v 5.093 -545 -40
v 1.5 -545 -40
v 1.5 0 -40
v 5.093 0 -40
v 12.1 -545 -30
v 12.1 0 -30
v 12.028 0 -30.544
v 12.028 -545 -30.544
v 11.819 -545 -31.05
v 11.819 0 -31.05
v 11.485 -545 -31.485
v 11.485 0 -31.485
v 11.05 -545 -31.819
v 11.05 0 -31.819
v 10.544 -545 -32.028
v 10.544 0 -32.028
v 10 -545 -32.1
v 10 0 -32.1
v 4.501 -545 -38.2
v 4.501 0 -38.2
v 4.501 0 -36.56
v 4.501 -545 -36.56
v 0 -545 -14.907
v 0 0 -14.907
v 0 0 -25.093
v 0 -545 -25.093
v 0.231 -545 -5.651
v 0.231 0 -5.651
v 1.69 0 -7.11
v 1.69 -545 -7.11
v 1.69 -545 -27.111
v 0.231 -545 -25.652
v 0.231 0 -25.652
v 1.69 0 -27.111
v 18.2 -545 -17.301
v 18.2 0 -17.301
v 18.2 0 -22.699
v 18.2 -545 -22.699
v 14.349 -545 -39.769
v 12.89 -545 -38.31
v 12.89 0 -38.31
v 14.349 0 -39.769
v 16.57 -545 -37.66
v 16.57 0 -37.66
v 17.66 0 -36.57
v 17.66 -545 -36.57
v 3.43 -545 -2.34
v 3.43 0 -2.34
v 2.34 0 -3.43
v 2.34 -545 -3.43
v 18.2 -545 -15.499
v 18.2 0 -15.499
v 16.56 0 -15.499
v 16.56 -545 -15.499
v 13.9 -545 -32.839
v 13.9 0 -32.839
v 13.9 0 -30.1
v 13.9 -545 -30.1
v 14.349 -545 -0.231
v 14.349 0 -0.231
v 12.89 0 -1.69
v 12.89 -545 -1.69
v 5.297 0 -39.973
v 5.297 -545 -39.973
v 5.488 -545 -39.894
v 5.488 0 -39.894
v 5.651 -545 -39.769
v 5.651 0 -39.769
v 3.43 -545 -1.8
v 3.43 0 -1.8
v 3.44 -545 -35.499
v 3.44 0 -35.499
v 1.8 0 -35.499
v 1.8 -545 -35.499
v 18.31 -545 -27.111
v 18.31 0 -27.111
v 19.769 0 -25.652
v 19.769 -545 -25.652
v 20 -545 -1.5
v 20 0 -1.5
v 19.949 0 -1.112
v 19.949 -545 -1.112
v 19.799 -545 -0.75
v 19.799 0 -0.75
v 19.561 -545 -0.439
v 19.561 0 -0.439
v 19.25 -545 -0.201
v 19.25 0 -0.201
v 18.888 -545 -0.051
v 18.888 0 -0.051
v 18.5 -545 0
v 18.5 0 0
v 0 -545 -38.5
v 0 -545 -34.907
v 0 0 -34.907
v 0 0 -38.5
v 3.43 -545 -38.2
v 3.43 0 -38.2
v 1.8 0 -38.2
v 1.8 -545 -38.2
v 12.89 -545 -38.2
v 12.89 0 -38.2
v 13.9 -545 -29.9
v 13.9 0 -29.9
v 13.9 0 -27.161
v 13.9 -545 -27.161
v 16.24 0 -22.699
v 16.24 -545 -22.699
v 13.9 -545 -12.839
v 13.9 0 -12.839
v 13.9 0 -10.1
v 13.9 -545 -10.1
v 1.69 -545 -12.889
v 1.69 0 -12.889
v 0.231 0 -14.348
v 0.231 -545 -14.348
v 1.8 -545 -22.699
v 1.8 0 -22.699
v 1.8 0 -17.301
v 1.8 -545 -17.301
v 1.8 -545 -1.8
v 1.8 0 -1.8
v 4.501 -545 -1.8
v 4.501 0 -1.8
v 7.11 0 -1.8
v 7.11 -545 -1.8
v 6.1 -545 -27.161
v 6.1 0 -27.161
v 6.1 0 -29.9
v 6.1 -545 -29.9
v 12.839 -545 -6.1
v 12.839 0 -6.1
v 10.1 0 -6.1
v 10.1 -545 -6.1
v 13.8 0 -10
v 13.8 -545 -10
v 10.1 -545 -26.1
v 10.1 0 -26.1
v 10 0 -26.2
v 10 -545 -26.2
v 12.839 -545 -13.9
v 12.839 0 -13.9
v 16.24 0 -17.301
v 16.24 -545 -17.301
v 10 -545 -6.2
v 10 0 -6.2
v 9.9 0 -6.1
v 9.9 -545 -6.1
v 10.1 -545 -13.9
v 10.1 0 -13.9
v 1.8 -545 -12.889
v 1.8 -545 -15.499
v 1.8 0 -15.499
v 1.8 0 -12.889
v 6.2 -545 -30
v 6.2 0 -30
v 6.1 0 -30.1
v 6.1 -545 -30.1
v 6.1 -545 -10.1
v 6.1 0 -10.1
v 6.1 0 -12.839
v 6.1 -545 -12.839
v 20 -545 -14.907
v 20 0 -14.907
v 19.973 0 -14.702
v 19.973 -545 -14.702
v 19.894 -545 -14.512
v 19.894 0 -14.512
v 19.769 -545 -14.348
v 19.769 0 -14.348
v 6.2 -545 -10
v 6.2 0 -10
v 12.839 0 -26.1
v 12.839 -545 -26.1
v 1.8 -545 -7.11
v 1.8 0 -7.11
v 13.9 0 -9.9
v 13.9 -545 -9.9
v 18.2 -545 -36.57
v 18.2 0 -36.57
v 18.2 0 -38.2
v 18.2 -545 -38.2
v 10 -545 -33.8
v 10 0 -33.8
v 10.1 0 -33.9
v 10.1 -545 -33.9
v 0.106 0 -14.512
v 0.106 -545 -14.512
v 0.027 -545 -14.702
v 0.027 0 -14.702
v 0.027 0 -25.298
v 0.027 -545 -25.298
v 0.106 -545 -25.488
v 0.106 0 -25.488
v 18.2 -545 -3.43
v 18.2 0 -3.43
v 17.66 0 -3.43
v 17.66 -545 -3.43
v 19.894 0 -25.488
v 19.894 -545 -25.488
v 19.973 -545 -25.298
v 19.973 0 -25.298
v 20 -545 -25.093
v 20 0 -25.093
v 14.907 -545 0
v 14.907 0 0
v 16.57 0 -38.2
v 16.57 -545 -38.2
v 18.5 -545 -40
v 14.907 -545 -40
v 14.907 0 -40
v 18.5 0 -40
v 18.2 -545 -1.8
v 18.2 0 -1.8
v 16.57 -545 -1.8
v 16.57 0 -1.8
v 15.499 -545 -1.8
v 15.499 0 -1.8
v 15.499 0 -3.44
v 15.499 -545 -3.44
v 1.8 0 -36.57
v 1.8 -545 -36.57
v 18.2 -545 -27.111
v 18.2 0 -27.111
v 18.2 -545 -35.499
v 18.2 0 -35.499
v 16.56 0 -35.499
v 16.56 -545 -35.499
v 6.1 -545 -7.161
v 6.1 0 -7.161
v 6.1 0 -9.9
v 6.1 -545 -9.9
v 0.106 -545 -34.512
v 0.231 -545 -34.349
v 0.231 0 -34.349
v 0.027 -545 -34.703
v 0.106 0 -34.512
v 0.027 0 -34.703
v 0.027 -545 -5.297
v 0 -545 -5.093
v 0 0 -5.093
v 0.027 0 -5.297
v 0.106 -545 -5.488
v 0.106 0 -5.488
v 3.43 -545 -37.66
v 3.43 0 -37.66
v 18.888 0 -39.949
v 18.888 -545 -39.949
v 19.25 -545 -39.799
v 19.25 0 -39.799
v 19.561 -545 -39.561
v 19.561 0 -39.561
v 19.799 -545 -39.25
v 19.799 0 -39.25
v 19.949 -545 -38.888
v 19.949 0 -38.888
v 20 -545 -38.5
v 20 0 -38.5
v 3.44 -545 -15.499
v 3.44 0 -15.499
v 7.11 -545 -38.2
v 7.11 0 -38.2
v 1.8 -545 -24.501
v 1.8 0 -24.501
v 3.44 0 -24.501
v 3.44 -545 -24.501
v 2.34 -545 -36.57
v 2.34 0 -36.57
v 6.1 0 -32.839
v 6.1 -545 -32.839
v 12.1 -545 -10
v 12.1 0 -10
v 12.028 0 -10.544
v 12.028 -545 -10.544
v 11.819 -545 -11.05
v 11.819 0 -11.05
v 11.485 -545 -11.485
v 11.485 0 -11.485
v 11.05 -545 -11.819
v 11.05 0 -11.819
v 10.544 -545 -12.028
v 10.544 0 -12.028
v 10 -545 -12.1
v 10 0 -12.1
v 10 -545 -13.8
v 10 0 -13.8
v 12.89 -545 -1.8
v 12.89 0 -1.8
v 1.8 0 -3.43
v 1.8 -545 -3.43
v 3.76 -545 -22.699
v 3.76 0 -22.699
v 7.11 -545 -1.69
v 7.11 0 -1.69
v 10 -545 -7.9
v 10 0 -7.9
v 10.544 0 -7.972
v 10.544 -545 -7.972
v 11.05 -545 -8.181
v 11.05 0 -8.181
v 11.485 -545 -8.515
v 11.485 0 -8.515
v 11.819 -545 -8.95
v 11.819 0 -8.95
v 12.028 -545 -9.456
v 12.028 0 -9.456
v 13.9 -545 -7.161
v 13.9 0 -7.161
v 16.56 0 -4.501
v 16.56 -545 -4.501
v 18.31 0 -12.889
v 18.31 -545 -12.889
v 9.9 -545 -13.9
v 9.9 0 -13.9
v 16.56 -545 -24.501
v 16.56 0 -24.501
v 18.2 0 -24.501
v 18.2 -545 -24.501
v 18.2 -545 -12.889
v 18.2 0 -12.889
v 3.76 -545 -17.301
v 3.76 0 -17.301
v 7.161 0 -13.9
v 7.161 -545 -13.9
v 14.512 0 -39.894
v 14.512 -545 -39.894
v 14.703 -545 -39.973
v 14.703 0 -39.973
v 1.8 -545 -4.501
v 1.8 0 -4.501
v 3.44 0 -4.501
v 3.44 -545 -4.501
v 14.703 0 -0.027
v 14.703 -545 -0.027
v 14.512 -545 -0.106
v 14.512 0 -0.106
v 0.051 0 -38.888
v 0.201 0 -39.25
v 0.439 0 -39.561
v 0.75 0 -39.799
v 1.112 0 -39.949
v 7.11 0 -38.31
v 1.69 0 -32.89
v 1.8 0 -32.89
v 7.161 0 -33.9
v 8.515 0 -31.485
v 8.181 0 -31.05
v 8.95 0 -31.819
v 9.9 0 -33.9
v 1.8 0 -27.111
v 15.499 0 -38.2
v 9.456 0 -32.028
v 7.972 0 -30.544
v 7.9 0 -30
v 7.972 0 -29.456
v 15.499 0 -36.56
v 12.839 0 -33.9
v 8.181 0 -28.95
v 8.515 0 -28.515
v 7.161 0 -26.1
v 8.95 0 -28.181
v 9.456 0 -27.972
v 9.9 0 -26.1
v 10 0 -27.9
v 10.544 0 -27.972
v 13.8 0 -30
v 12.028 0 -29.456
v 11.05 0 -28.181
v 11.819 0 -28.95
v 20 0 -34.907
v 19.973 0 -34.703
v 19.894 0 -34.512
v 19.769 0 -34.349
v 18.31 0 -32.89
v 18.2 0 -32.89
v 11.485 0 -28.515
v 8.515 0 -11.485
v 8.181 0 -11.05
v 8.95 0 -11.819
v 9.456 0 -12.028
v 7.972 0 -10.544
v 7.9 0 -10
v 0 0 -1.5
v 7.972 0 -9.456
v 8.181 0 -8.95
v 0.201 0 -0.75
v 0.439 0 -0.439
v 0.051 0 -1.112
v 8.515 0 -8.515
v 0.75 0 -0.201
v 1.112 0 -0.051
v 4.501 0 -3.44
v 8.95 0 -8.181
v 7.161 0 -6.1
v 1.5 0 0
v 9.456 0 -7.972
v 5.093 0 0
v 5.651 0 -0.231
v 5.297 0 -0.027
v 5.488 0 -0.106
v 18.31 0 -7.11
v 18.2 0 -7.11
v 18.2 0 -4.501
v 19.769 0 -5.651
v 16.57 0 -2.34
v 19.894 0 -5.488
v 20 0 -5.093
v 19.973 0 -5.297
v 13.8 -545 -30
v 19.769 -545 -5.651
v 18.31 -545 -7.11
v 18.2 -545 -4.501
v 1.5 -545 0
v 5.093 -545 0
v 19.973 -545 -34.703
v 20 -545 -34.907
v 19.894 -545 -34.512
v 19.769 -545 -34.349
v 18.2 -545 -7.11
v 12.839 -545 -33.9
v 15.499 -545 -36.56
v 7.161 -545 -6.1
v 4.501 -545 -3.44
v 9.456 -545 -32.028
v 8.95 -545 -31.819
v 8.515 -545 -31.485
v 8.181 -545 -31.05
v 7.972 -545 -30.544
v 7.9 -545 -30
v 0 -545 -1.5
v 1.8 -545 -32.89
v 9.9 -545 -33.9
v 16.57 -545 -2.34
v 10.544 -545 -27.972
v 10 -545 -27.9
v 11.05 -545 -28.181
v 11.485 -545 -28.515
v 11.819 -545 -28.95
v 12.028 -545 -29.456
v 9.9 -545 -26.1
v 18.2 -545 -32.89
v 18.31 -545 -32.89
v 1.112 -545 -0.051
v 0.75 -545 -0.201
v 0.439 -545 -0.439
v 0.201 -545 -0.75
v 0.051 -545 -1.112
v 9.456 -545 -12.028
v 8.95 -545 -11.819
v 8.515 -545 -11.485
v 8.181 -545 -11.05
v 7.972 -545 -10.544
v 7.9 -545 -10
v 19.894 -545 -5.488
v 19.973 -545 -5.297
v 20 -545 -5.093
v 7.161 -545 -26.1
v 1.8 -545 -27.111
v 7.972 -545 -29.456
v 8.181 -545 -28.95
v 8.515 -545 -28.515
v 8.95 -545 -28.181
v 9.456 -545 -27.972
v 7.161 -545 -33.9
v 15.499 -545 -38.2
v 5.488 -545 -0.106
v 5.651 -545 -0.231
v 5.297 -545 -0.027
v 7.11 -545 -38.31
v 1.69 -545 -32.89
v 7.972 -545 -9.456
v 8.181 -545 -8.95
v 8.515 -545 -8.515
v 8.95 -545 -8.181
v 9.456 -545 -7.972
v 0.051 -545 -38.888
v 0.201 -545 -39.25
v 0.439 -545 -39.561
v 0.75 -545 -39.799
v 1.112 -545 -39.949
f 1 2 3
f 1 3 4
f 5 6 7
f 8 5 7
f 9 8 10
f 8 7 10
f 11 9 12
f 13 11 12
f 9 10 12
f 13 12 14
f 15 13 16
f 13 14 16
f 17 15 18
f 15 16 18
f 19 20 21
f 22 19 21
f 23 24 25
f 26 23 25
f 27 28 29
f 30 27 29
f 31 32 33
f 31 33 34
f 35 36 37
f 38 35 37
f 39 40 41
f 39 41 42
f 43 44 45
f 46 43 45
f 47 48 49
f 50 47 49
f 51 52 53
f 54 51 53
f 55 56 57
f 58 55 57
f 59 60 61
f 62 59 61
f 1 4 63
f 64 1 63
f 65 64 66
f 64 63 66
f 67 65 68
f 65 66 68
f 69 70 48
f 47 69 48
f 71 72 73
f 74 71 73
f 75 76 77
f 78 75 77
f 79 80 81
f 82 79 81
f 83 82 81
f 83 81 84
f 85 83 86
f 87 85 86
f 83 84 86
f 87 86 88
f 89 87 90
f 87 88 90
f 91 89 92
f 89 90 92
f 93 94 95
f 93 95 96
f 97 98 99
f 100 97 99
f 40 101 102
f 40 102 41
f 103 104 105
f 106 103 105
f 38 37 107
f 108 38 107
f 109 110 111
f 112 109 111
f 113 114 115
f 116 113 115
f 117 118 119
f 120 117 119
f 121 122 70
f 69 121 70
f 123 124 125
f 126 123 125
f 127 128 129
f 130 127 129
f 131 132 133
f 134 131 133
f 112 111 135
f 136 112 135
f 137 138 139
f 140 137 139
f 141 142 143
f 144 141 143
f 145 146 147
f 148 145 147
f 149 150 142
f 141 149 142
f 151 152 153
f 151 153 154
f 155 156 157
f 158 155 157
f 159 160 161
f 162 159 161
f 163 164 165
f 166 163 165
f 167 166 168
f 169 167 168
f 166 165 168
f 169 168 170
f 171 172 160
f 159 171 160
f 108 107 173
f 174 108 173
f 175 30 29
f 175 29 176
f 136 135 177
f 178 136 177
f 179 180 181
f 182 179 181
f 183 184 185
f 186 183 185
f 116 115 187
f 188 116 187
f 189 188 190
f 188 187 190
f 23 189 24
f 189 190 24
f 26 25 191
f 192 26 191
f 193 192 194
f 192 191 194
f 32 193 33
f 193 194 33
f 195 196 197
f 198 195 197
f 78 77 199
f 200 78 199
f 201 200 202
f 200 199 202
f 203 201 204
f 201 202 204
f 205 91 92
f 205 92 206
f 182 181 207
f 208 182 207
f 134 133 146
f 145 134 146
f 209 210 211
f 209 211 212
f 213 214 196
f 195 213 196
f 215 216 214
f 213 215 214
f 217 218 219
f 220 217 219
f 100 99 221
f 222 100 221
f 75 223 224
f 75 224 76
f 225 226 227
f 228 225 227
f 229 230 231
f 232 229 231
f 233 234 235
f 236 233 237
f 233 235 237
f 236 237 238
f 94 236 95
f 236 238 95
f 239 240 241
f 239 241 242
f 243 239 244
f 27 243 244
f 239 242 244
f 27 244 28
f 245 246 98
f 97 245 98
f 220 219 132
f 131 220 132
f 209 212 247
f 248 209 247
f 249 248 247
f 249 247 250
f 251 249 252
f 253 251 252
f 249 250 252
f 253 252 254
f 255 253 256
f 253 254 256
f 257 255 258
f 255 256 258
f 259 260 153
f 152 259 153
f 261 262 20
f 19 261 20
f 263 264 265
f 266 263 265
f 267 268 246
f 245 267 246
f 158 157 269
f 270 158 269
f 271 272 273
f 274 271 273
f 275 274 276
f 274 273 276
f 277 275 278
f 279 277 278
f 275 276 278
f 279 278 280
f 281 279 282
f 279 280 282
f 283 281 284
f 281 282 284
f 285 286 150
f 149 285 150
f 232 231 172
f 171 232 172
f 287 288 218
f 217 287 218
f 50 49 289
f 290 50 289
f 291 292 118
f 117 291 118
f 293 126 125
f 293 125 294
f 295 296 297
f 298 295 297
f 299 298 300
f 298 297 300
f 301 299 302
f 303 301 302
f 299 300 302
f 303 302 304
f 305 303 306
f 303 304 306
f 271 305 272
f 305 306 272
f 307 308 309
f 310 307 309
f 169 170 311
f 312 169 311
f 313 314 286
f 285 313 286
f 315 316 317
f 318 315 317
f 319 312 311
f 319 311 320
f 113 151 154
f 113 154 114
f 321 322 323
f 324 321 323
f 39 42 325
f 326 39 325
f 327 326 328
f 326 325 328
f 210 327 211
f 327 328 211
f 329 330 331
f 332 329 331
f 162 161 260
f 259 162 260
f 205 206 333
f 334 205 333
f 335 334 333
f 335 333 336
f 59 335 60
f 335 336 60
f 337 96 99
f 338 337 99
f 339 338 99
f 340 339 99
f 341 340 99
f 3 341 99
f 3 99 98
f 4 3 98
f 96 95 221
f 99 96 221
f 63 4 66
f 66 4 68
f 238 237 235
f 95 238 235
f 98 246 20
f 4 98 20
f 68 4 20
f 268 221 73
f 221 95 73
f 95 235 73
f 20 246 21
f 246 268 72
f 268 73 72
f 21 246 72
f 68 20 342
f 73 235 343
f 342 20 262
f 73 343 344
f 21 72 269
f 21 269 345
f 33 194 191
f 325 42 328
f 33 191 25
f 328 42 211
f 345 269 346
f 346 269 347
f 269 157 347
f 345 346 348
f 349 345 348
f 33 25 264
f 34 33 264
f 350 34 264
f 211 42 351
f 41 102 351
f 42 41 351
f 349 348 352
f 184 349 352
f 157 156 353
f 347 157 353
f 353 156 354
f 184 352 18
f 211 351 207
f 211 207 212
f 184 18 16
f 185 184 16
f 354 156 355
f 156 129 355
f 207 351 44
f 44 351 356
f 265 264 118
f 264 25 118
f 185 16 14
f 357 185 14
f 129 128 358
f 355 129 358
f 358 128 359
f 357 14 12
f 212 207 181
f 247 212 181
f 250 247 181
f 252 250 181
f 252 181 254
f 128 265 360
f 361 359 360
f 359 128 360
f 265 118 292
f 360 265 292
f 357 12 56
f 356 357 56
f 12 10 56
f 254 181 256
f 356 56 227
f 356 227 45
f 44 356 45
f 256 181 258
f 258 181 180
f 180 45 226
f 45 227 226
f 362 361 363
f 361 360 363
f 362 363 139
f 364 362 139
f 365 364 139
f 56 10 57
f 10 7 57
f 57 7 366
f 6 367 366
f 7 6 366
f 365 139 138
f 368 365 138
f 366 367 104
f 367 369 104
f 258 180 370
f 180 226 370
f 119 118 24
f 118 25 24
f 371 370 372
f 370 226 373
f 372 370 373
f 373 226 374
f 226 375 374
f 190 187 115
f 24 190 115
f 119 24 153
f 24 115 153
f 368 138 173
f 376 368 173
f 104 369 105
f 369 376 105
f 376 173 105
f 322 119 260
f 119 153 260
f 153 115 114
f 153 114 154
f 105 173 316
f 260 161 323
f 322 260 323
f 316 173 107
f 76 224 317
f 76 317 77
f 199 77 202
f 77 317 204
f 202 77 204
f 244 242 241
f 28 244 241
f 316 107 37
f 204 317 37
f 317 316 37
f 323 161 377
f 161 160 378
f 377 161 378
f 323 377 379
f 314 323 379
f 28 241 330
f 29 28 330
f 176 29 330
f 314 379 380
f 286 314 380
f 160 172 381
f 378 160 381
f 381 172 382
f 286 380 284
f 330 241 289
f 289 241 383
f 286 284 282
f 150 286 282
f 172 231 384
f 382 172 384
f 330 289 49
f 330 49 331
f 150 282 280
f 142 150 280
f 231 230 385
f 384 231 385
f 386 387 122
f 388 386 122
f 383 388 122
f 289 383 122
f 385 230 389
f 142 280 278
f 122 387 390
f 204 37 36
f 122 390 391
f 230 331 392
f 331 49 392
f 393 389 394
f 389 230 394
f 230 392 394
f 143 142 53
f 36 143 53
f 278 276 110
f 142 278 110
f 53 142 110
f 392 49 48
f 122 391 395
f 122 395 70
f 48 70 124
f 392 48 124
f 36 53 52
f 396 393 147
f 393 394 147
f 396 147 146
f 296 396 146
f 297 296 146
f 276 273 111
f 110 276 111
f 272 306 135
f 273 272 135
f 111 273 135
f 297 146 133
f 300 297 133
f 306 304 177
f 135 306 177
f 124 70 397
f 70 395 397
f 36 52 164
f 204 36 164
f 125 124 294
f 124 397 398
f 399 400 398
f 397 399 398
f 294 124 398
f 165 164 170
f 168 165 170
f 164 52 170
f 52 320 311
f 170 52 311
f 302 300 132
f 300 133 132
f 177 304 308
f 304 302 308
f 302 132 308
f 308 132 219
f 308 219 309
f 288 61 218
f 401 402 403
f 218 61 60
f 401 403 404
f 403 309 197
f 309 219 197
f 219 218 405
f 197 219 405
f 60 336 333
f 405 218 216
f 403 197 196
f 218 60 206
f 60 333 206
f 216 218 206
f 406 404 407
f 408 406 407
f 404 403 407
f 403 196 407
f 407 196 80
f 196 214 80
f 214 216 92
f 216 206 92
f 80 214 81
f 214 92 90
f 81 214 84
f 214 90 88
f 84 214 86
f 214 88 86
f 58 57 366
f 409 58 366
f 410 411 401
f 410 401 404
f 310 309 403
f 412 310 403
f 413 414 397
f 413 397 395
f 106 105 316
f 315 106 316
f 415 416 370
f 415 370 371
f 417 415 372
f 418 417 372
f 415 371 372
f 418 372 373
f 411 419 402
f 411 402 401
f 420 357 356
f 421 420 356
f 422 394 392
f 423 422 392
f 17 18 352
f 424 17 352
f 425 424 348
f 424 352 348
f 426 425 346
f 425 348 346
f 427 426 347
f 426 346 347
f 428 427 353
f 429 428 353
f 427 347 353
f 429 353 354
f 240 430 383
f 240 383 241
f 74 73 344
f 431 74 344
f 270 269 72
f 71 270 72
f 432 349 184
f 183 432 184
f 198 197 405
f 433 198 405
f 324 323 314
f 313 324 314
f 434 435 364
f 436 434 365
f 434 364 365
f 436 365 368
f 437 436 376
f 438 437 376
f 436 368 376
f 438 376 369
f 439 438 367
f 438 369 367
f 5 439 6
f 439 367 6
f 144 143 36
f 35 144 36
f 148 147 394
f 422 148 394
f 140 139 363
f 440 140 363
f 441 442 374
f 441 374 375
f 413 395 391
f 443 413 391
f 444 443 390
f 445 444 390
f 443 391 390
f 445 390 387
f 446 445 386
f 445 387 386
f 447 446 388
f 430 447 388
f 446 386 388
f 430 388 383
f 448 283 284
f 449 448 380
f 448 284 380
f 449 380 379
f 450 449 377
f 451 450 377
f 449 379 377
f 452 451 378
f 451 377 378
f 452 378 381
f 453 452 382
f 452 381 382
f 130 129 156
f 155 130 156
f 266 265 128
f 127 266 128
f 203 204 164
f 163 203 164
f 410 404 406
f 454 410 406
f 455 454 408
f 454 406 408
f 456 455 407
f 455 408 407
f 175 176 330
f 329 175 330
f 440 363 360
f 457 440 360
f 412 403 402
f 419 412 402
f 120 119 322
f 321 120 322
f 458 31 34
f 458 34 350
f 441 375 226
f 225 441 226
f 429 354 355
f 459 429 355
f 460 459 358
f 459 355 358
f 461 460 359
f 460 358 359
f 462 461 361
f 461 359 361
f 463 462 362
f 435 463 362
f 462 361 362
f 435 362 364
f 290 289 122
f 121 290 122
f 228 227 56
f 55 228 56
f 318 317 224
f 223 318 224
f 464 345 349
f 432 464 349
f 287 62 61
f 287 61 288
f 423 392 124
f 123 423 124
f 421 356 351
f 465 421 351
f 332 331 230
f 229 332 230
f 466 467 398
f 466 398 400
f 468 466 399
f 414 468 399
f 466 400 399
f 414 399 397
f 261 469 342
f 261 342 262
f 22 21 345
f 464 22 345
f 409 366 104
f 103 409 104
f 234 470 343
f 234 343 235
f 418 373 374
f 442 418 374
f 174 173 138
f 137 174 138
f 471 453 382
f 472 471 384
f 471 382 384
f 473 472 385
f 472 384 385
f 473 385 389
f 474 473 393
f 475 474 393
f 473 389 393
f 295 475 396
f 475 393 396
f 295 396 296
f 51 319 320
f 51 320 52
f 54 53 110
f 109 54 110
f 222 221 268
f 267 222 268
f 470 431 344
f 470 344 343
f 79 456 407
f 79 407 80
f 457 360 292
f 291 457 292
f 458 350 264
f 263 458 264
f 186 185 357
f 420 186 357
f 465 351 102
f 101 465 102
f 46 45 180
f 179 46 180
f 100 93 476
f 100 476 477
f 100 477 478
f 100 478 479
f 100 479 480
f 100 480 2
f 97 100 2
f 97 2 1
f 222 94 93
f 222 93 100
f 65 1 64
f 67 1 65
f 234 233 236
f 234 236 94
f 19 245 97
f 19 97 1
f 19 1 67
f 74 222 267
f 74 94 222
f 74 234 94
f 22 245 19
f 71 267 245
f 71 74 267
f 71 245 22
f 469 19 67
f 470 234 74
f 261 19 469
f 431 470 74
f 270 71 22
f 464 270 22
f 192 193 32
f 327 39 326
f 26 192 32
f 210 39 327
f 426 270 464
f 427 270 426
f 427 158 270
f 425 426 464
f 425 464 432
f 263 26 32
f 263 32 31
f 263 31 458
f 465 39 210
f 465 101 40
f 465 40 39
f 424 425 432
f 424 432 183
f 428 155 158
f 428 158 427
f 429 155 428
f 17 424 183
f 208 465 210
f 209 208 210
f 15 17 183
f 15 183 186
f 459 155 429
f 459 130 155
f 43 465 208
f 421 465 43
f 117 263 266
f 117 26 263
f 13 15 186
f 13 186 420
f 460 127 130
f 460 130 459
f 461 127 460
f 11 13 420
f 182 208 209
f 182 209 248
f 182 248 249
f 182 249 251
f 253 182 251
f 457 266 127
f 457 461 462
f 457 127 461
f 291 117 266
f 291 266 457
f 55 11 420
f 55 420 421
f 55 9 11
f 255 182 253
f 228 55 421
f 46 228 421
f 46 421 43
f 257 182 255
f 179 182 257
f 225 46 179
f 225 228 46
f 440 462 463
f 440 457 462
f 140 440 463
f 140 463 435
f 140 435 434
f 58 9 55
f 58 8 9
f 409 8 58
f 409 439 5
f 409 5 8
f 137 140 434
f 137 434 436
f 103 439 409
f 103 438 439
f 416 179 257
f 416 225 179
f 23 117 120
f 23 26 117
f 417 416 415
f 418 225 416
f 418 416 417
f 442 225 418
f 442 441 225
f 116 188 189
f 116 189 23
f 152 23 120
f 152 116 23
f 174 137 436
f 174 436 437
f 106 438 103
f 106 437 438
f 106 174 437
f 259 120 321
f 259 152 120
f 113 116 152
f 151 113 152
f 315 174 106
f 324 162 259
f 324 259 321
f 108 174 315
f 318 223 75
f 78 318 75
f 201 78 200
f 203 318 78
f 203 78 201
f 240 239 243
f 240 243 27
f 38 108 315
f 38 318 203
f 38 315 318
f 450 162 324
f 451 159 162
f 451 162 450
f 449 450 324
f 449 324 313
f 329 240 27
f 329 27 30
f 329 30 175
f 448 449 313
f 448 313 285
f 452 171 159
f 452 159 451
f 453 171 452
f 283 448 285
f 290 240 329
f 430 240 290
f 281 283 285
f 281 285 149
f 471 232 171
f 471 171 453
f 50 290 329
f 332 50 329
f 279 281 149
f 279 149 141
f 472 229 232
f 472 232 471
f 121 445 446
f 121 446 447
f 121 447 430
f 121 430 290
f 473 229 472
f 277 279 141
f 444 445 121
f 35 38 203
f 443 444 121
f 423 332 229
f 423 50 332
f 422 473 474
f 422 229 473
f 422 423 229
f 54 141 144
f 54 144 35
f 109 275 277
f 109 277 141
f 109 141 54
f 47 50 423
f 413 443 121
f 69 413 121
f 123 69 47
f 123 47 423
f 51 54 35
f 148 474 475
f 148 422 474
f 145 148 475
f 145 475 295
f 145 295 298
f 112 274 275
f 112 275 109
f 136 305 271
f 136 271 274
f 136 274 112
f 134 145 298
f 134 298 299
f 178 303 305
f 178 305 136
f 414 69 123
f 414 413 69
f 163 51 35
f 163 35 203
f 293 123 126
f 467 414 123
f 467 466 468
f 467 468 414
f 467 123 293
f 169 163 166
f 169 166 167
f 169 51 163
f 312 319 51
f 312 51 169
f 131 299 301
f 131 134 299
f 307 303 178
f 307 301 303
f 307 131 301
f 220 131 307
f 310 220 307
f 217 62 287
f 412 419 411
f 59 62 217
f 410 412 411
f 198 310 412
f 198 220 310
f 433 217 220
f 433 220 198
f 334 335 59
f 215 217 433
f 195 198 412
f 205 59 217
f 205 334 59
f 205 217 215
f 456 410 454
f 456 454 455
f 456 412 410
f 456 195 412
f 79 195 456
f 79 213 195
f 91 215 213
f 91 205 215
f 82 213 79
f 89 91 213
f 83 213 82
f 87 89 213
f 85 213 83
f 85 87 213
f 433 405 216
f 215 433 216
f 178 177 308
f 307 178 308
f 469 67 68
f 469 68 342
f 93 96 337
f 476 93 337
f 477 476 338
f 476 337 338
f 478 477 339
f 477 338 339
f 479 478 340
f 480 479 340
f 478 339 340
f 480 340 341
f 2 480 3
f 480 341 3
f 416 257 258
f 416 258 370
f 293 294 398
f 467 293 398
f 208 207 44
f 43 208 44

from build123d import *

# Parameters (mm, degrees)
F2_DEPTH = 545


with BuildPart() as f2:
    # F0 (on Front) → F2 (new body)
    with BuildSketch(Plane.XZ):
        with BuildLine():
            Line((5.0927712857, 0), (1.5, 0))
            ThreePointArc((1.5, 0), (0.4393398282, -0.4393398282), (0, -1.5))
            Line((0, -1.5), (0, -5.0927712857))
            ThreePointArc((0, -5.0927712857), (0.0601351693, -5.3950911973), (0.2313856429, -5.6513856429))
            Line((0.2313856429, -5.6513856429), (1.69, -7.11))
            Line((1.69, -7.11), (1.8, -7.11))
            Line((1.8, -7.11), (1.8, -4.5006601718))
            Line((1.8, -4.5006601718), (3.44, -4.5006601718))
            Line((3.44, -4.5006601718), (6.1000000155, -7.1606601718))
            Line((6.1000000155, -7.1606601718), (6.1000000155, -9.9))
            Line((6.1000000155, -9.9), (6.2000000155, -10))
            Line((6.2000000155, -10), (6.1000000155, -10.1))
            Line((6.1000000155, -10.1), (6.1000000155, -12.8393398605))
            Line((6.1000000155, -12.8393398605), (3.44, -15.4993398916))
            Line((3.44, -15.4993398916), (1.8, -15.4993398916))
            Line((1.8, -15.4993398916), (1.8, -12.8893398916))
            Line((1.8, -12.8893398916), (1.69, -12.8893398916))
            Line((1.69, -12.8893398916), (0.2313856429, -14.3479542487))
            ThreePointArc((0.2313856429, -14.3479542487), (0.0601351693, -14.6042486943), (0, -14.9065686059))
            Line((0, -14.9065686059), (0, -20))
            Line((0, -20), (0, -25.0934313941))
            ThreePointArc((0, -25.0934313941), (0.0601351693, -25.3957513057), (0.2313856429, -25.6520457513))
            Line((0.2313856429, -25.6520457513), (1.69, -27.1106601084))
            Line((1.69, -27.1106601084), (1.8, -27.1106601084))
            Line((1.8, -27.1106601084), (1.8, -24.5006601084))
            Line((1.8, -24.5006601084), (3.44, -24.5006601084))
            Line((3.44, -24.5006601084), (6.1000000155, -27.1606601395))
            Line((6.1000000155, -27.1606601395), (6.1000000155, -29.9))
            Line((6.1000000155, -29.9), (6.2000000155, -30))
            Line((6.2000000155, -30), (6.1000000155, -30.1))
            Line((6.1000000155, -30.1), (6.1000000155, -32.8393398282))
            Line((6.1000000155, -32.8393398282), (3.44, -35.4993398282))
            Line((3.44, -35.4993398282), (1.8, -35.4993398282))
            Line((1.8, -35.4993398282), (1.8, -32.89))
            Line((1.8, -32.89), (1.69, -32.89))
            Line((1.69, -32.89), (0.2313856429, -34.3486143571))
            ThreePointArc((0.2313856429, -34.3486143571), (0.0601351693, -34.6049088027), (0, -34.9072287143))
            Line((0, -34.9072287143), (0, -38.5))
            ThreePointArc((0, -38.5), (0.4393398282, -39.5606601718), (1.5, -40))
            Line((1.5, -40), (5.0927712857, -40))
            ThreePointArc((5.0927712857, -40), (5.3950911973, -39.9398648307), (5.6513856429, -39.7686143571))
            Line((5.6513856429, -39.7686143571), (7.11, -38.31))
            Line((7.11, -38.31), (7.11, -38.2))
            Line((7.11, -38.2), (4.5006601718, -38.2))
            Line((4.5006601718, -38.2), (4.5006601718, -36.56))
            Line((4.5006601718, -36.56), (7.1606601873, -33.9))
            Line((7.1606601873, -33.9), (9.9000000155, -33.9))
            Line((9.9000000155, -33.9), (10.0000000478, -33.8000000323))
            Line((10.0000000478, -33.8000000323), (10.1000000802, -33.9))
            Line((10.1000000802, -33.9), (12.8393399084, -33.9))
            Line((12.8393399084, -33.9), (15.4993399239, -36.56))
            Line((15.4993399239, -36.56), (15.4993399239, -38.2))
            Line((15.4993399239, -38.2), (12.8900000957, -38.2))
            Line((12.8900000957, -38.2), (12.8900000957, -38.31))
            Line((12.8900000957, -38.31), (14.3486144528, -39.7686143571))
            ThreePointArc((14.3486144528, -39.7686143571), (14.6049088984, -39.9398648307), (14.90722881, -40))
            Line((14.90722881, -40), (18.5000000957, -40))
            ThreePointArc((18.5000000957, -40), (19.5606602675, -39.5606601718), (20.0000000957, -38.5))
            Line((20.0000000957, -38.5), (20.0000000957, -34.9072287143))
            ThreePointArc((20.0000000957, -34.9072287143), (19.9398649264, -34.6049088027), (19.7686144528, -34.3486143571))
            Line((19.7686144528, -34.3486143571), (18.3100000957, -32.89))
            Line((18.3100000957, -32.89), (18.2000000957, -32.89))
            Line((18.2000000957, -32.89), (18.2000000957, -35.4993398282))
            Line((18.2000000957, -35.4993398282), (16.5600000957, -35.4993398282))
            Line((16.5600000957, -35.4993398282), (13.9000000802, -32.8393398282))
            Line((13.9000000802, -32.8393398282), (13.9000000802, -30.1))
            Line((13.9000000802, -30.1), (13.8000000802, -30))
            Line((13.8000000802, -30), (13.9000000802, -29.9))
            Line((13.9000000802, -29.9), (13.9000000802, -27.1606601395))
            Line((13.9000000802, -27.1606601395), (16.5600000957, -24.5006601084))
            Line((16.5600000957, -24.5006601084), (18.2000000957, -24.5006601084))
            Line((18.2000000957, -24.5006601084), (18.2000000957, -27.1106601084))
            Line((18.2000000957, -27.1106601084), (18.3100000957, -27.1106601084))
            Line((18.3100000957, -27.1106601084), (19.7686144528, -25.6520457513))
            ThreePointArc((19.7686144528, -25.6520457513), (19.9398649264, -25.3957513057), (20.0000000957, -25.0934313941))
            Line((20.0000000957, -25.0934313941), (20.0000000957, -20))
            Line((20.0000000957, -20), (20.0000000957, -14.9065686059))
            ThreePointArc((20.0000000957, -14.9065686059), (19.9398649264, -14.6042486943), (19.7686144528, -14.3479542487))
            Line((19.7686144528, -14.3479542487), (18.3100000957, -12.8893398916))
            Line((18.3100000957, -12.8893398916), (18.2000000957, -12.8893398916))
            Line((18.2000000957, -12.8893398916), (18.2000000957, -15.4993398916))
            Line((18.2000000957, -15.4993398916), (16.5600000957, -15.4993398916))
            Line((16.5600000957, -15.4993398916), (13.9000000802, -12.8393398605))
            Line((13.9000000802, -12.8393398605), (13.9000000802, -10.1))
            Line((13.9000000802, -10.1), (13.8000000802, -10))
            Line((13.8000000802, -10), (13.9000000802, -9.9))
            Line((13.9000000802, -9.9), (13.9000000802, -7.1606601718))
            Line((13.9000000802, -7.1606601718), (16.5600000957, -4.5006601718))
            Line((16.5600000957, -4.5006601718), (18.2000000957, -4.5006601718))
            Line((18.2000000957, -4.5006601718), (18.2000000957, -7.11))
            Line((18.2000000957, -7.11), (18.3100000957, -7.11))
            Line((18.3100000957, -7.11), (19.7686144528, -5.6513856429))
            ThreePointArc((19.7686144528, -5.6513856429), (19.9398649264, -5.3950911973), (20.0000000957, -5.0927712857))
            Line((20.0000000957, -5.0927712857), (20.0000000957, -1.5))
            ThreePointArc((20.0000000957, -1.5), (19.5606602675, -0.4393398282), (18.5000000957, 0))
            Line((18.5000000957, 0), (14.90722881, 0))
            ThreePointArc((14.90722881, 0), (14.6049088984, -0.0601351693), (14.3486144528, -0.2313856429))
            Line((14.3486144528, -0.2313856429), (12.8900000957, -1.69))
            Line((12.8900000957, -1.69), (12.8900000957, -1.8))
            Line((12.8900000957, -1.8), (15.4993399239, -1.8))
            Line((15.4993399239, -1.8), (15.4993399239, -3.44))
            Line((15.4993399239, -3.44), (12.8393399084, -6.1))
            Line((12.8393399084, -6.1), (10.1000000802, -6.1))
            Line((10.1000000802, -6.1), (10.0000000478, -6.1999999677))
            Line((10.0000000478, -6.1999999677), (9.9000000155, -6.1))
            Line((9.9000000155, -6.1), (7.1606601873, -6.1))
            Line((7.1606601873, -6.1), (4.5006601718, -3.44))
            Line((4.5006601718, -3.44), (4.5006601718, -1.8))
            Line((4.5006601718, -1.8), (7.11, -1.8))
            Line((7.11, -1.8), (7.11, -1.69))
            Line((7.11, -1.69), (5.6513856429, -0.2313856429))
            ThreePointArc((5.6513856429, -0.2313856429), (5.3950911973, -0.0601351693), (5.0927712857, 0))
        make_face()
        Polygon((1.8, -38.2), (1.8, -36.57), (2.34, -36.57), (3.43, -37.66), (3.43, -38.2), align=None, mode=Mode.SUBTRACT)
        with BuildLine():
            ThreePointArc((10.0000000478, -27.9), (11.4849242883, -28.5150757595), (12.1000000478, -30))
            ThreePointArc((12.1000000478, -30), (11.4849242883, -31.4849242405), (10.0000000478, -32.1))
            ThreePointArc((10.0000000478, -32.1), (8.5150758074, -31.4849242405), (7.9000000478, -30))
            ThreePointArc((7.9000000478, -30), (8.5150758074, -28.5150757595), (10.0000000478, -27.9))
        make_face(mode=Mode.SUBTRACT)
        Polygon((17.6600000957, -36.57), (18.2000000957, -36.57), (18.2000000957, -38.2), (16.5700000957, -38.2), (16.5700000957, -37.66), align=None, mode=Mode.SUBTRACT)
        Polygon((9.9000000478, -13.9000000323), (10.0000000478, -13.8000000323), (10.1000000478, -13.9000000323), (12.8393399084, -13.9000000323), (16.2400000478, -17.3006601916), (18.2000000478, -17.3006601916), (18.2000000478, -20), (18.2000000478, -22.6993398084), (16.2400000478, -22.6993398084), (12.8393399084, -26.0999999677), (10.1000000478, -26.0999999677), (10.0000000478, -26.1999999677), (9.9000000478, -26.0999999677), (7.1606601873, -26.0999999677), (3.7600000478, -22.6993398084), (1.8000000478, -22.6993398084), (1.8000000478, -20), (1.8000000478, -17.3006601916), (3.7600000478, -17.3006601916), (7.1606601873, -13.9000000323), align=None, mode=Mode.SUBTRACT)
        Polygon((1.8, -3.43), (1.8, -1.8), (3.43, -1.8), (3.43, -2.34), (2.34, -3.43), align=None, mode=Mode.SUBTRACT)
        with BuildLine():
            ThreePointArc((7.9000000478, -10), (8.5150758074, -8.5150757595), (10.0000000478, -7.9))
            ThreePointArc((10.0000000478, -7.9), (11.4849242883, -8.5150757595), (12.1000000478, -10))
            ThreePointArc((12.1000000478, -10), (11.4849242883, -11.4849242405), (10.0000000478, -12.1))
            ThreePointArc((10.0000000478, -12.1), (8.5150758074, -11.4849242405), (7.9000000478, -10))
        make_face(mode=Mode.SUBTRACT)
        Polygon((16.5700000957, -2.34), (16.5700000957, -1.8), (18.2000000957, -1.8), (18.2000000957, -3.43), (17.6600000957, -3.43), align=None, mode=Mode.SUBTRACT)
    extrude(amount=F2_DEPTH)


solid = f2.part
